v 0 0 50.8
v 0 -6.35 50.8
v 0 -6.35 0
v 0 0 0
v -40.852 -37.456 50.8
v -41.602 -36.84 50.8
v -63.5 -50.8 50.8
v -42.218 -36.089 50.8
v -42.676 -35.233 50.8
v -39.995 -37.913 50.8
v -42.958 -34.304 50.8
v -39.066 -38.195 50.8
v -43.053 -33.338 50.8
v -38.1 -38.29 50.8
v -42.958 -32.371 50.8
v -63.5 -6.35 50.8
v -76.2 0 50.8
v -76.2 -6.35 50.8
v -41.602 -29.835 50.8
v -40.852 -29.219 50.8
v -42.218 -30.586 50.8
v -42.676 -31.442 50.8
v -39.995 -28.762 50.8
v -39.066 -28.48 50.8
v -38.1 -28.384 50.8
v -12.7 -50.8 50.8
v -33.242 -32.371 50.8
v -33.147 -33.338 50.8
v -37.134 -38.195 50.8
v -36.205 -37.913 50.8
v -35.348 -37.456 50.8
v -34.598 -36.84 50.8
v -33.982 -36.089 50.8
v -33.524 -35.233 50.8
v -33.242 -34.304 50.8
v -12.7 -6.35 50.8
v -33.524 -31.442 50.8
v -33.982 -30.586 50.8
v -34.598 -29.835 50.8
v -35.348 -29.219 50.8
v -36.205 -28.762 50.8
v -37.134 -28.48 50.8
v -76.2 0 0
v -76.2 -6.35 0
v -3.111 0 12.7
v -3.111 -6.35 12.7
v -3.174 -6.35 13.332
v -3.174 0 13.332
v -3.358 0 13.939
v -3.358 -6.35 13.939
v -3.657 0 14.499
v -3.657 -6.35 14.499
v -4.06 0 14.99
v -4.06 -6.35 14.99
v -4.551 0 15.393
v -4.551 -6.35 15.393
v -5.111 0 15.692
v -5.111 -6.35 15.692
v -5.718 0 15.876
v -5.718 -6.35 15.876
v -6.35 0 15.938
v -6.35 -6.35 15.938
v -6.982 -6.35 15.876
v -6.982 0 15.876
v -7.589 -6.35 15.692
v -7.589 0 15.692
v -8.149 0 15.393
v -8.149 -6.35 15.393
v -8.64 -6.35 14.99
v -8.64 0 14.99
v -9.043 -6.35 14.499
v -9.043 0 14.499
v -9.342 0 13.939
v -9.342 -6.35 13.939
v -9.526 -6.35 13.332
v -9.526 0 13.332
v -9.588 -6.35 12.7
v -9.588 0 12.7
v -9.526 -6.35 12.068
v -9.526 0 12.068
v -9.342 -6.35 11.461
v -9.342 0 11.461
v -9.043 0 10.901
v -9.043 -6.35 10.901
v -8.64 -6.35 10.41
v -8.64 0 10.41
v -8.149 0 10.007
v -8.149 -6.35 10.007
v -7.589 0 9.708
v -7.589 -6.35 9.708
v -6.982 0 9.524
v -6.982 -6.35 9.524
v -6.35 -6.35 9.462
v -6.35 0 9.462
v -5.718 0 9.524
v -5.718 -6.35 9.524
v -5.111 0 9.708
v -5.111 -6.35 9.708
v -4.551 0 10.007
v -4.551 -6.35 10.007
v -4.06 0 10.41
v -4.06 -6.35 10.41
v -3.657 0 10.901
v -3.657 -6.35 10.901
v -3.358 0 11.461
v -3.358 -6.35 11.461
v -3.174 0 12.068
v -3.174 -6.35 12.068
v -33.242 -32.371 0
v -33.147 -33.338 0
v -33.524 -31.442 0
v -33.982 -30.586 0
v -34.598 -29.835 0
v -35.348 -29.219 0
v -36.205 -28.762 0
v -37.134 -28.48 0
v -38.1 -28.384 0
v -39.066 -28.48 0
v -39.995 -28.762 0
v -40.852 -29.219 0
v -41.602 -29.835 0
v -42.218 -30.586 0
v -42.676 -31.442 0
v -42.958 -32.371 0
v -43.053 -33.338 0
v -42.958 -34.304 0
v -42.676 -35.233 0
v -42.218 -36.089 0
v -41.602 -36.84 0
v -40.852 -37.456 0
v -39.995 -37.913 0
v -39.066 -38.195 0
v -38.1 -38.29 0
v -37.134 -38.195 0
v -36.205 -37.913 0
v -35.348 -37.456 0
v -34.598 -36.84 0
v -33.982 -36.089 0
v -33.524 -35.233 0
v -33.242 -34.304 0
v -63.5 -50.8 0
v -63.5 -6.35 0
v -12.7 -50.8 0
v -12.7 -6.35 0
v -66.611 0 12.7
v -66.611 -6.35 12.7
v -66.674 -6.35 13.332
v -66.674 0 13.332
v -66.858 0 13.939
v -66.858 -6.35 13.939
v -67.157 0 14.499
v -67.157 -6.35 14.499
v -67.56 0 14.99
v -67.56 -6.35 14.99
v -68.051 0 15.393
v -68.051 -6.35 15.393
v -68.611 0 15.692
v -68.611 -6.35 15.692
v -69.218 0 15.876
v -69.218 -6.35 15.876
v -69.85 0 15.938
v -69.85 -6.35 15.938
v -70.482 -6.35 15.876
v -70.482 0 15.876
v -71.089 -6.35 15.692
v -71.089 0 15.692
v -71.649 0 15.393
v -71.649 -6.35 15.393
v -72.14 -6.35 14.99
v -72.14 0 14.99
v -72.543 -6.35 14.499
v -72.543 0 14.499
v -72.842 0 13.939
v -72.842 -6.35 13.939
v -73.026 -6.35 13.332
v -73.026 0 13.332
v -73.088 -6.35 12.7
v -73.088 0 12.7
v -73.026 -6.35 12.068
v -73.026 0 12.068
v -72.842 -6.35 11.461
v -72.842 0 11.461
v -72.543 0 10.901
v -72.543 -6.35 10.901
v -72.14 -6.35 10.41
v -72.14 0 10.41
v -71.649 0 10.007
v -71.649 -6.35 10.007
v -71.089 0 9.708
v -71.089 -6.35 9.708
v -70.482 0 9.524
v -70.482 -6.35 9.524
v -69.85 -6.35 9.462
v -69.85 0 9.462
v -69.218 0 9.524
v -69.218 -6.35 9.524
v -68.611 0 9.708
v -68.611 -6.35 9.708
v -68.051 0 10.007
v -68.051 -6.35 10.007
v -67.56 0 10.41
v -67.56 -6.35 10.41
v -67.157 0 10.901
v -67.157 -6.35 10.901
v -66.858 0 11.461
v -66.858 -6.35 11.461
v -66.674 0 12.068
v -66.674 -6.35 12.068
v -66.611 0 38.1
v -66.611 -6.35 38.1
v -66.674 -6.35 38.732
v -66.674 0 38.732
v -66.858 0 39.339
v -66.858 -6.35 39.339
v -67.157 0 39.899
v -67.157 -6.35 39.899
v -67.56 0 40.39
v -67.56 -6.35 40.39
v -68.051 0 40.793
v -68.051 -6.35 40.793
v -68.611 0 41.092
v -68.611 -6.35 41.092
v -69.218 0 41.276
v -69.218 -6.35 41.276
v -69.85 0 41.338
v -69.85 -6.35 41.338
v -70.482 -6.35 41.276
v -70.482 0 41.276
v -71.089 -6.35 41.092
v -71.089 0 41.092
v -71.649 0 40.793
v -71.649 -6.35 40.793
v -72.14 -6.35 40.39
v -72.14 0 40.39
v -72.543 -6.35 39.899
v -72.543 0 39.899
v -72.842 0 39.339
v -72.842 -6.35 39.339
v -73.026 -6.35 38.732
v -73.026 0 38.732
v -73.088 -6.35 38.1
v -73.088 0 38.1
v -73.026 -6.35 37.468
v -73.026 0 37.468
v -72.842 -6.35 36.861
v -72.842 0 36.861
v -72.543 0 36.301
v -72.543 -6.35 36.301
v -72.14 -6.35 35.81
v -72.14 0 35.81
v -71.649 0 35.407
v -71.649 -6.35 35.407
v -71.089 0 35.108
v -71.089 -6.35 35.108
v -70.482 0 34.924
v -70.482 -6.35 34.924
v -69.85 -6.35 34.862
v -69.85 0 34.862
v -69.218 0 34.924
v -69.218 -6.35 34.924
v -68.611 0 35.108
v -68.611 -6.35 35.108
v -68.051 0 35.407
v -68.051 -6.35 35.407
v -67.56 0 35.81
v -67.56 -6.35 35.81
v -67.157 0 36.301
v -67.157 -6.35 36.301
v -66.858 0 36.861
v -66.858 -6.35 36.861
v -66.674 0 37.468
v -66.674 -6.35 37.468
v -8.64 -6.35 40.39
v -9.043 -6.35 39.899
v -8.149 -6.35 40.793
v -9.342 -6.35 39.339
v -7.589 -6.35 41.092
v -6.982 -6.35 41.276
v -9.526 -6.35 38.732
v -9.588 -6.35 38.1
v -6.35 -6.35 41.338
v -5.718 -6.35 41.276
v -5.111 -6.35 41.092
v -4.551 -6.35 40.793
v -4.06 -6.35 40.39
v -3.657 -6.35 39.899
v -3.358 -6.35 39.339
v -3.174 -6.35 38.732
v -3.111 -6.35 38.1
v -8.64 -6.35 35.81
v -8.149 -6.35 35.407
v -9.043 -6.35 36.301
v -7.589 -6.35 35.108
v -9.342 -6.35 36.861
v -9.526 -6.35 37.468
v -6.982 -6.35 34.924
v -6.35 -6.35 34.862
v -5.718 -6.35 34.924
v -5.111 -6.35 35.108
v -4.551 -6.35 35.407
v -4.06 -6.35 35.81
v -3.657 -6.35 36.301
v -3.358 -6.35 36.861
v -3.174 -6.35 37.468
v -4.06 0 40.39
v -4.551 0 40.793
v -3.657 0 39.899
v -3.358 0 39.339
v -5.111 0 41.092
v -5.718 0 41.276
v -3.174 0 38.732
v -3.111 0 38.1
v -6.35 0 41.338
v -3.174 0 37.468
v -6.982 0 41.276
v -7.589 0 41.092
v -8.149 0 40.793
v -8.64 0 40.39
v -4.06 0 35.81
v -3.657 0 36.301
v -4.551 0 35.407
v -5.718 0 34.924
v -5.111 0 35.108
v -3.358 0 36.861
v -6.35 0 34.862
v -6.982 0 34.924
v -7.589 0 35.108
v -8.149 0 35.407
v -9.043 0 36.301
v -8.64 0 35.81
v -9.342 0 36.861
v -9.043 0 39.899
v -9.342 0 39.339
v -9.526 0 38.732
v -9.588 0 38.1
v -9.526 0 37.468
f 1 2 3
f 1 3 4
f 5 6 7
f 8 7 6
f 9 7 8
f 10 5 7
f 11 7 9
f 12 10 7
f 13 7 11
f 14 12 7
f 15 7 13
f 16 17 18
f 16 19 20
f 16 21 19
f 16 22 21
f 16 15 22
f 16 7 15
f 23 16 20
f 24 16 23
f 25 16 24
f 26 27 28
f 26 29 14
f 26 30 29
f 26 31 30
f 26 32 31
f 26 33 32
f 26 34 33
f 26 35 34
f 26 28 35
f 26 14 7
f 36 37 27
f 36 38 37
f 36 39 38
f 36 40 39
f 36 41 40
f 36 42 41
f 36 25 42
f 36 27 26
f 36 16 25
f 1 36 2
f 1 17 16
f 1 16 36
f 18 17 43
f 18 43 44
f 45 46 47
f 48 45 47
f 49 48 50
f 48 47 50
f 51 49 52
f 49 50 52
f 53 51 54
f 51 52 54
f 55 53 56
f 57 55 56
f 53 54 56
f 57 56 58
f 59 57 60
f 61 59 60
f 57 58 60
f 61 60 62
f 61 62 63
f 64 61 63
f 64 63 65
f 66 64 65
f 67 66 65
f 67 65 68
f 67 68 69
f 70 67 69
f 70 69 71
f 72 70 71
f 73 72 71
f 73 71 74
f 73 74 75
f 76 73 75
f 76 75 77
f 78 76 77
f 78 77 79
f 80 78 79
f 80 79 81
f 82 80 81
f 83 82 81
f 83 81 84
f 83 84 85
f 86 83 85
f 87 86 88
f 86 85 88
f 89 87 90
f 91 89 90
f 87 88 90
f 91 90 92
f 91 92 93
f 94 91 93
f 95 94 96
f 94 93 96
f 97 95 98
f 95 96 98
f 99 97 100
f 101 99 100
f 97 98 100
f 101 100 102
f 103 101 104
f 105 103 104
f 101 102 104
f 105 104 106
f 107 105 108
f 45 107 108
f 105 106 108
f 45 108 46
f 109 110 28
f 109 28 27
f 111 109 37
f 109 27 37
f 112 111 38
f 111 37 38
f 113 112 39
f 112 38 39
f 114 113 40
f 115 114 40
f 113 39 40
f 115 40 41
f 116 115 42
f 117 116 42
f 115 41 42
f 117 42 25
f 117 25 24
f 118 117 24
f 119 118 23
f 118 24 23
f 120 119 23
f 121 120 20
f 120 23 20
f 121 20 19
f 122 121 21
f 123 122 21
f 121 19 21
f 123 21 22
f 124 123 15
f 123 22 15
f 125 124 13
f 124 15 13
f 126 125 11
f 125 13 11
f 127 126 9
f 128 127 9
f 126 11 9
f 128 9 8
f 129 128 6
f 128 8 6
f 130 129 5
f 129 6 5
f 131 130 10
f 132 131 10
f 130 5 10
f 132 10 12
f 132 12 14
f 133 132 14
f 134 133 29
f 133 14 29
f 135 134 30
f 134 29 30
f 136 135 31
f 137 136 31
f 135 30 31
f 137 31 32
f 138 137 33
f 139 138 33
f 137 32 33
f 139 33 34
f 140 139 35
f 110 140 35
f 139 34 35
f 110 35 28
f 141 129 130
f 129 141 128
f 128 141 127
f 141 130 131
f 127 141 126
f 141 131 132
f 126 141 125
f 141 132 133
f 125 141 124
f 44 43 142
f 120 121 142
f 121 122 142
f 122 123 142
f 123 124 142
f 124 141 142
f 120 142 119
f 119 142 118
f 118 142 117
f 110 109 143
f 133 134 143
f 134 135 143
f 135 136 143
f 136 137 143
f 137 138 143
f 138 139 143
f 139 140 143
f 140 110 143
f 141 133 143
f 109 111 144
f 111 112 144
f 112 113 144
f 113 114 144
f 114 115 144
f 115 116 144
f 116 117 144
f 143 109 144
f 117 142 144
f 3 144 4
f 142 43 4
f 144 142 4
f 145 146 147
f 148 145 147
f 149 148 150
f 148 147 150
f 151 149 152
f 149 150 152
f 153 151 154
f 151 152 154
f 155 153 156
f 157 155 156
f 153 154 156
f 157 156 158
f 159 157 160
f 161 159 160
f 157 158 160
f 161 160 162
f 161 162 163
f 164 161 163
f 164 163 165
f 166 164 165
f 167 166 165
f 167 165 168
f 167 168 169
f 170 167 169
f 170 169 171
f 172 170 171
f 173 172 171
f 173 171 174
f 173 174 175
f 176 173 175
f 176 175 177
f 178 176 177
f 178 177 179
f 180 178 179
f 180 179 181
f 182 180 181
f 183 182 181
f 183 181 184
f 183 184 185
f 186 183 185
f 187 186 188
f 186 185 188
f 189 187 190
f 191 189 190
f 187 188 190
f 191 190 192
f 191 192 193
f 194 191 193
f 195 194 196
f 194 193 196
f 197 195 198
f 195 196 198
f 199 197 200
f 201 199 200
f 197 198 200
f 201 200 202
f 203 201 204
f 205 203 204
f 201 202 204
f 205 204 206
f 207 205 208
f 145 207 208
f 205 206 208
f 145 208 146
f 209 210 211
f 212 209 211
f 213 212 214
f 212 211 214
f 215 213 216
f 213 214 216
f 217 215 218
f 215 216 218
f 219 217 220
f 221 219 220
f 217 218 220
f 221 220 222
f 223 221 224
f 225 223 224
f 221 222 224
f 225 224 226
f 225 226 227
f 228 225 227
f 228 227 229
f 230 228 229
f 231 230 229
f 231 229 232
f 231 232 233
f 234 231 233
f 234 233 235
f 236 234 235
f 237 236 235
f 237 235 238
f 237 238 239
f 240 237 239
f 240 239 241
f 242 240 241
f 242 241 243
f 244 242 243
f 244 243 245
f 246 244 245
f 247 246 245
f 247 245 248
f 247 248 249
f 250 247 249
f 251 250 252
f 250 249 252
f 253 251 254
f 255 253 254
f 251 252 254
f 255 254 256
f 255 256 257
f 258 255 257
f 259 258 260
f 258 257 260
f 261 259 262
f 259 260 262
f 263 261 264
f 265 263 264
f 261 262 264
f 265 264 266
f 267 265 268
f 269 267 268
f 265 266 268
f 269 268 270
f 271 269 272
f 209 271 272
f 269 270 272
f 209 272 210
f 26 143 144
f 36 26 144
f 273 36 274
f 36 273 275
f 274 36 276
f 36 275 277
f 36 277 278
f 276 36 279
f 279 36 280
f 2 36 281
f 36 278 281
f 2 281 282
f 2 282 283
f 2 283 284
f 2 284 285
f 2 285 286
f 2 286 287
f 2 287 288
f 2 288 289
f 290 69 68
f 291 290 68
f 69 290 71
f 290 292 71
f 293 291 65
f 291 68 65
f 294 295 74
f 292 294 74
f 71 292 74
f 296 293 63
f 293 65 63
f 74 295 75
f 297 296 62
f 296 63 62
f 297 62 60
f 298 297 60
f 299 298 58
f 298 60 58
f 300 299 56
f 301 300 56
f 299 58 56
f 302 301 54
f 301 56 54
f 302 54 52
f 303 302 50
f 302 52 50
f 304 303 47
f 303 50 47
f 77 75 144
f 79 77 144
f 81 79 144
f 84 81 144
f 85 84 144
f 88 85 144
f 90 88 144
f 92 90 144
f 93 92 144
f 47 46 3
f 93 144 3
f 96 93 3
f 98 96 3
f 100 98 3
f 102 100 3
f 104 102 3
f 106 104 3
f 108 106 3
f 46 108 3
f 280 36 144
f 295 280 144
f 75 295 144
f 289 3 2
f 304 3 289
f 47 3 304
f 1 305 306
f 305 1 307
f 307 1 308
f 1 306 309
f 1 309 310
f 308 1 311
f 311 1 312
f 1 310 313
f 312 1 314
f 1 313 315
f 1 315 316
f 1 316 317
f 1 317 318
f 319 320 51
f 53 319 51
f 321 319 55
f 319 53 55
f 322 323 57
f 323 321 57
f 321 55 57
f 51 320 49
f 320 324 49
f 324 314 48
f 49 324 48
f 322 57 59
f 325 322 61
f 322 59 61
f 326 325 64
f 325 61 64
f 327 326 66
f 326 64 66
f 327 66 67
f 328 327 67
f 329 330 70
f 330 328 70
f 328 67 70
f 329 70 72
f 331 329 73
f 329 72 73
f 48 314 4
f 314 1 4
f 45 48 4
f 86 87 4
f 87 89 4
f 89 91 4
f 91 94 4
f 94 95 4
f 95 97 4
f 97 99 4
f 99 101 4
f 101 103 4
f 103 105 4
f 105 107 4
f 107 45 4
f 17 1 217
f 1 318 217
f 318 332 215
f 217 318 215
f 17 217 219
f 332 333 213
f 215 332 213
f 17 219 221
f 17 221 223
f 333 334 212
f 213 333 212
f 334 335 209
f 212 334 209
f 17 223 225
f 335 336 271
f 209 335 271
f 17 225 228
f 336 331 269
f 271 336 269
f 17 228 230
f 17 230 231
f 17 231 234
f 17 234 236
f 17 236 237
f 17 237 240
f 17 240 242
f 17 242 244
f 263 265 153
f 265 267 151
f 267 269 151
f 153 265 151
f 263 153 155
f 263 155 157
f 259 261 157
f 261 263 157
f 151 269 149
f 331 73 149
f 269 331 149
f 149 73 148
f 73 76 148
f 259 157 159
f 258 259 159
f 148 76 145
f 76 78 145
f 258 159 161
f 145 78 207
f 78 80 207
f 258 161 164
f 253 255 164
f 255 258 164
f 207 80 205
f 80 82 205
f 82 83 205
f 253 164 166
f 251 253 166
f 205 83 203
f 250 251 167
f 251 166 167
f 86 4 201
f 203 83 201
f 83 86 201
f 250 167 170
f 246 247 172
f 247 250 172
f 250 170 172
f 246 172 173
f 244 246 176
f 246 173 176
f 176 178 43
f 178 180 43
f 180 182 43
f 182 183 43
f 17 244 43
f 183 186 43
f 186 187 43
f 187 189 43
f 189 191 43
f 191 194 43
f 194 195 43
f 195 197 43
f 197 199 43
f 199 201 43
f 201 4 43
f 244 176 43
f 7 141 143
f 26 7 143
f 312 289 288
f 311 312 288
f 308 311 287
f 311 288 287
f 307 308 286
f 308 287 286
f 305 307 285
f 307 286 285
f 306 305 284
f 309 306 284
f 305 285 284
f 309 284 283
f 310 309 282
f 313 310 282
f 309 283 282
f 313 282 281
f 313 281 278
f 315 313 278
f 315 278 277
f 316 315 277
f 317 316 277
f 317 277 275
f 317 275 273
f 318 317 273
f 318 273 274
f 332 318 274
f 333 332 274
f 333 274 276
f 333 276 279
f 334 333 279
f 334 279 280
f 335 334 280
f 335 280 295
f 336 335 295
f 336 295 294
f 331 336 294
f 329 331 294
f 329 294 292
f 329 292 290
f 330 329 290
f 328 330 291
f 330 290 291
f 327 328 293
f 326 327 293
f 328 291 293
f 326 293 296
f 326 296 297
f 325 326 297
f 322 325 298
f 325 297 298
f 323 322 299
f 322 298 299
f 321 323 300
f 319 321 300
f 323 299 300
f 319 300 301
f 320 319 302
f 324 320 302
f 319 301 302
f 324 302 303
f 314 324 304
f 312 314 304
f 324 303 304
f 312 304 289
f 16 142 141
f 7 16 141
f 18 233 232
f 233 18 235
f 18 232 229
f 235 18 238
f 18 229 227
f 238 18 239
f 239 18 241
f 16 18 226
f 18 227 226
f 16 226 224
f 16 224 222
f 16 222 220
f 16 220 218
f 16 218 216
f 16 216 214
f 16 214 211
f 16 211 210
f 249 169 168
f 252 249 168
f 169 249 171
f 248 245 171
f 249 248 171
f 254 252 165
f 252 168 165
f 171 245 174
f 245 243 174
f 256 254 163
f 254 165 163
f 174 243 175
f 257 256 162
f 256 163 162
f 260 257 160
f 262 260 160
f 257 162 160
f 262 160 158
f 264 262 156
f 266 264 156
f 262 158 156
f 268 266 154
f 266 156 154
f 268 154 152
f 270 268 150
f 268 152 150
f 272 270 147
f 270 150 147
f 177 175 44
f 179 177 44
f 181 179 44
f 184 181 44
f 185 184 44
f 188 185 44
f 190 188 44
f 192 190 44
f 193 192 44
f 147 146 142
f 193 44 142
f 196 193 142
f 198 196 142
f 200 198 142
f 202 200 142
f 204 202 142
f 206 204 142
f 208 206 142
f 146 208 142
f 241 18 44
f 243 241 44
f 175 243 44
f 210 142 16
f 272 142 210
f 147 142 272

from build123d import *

# Parameters (mm, degrees)
F1_DEPTH = 50.8
F2_R     = 4.953
F3_DEPTH = 50.8
F5_R     = 3.2385
F4_R     = 3.2385
F6_DEPTH = 25.4


with BuildPart() as f1:
    # F0 (on Top) → F1 (new body)
    with BuildSketch(Plane.XY):
        Polygon((0, -6.35), (0, 0), (-76.2, 0), (-76.2, -6.35), (-63.5, -6.35), (-63.5, -50.8), (-12.7, -50.8), (-12.7, -6.35), align=None)
    extrude(amount=F1_DEPTH)

    # F2 (on face) → F3 (cut)
    with BuildSketch(Plane.XY.offset(50.8)):
        with Locations((-38.1, -33.3375)):
            Circle(F2_R)
    extrude(amount=-F3_DEPTH, mode=Mode.SUBTRACT)

    # F5 (on face) + F4 (on face) → F6 (cut)
    with BuildSketch(Plane.XZ.offset(6.35)):
        with Locations((-69.85, 12.7)):
            Circle(F5_R)
        with Locations((-69.85, 38.1)):
            Circle(F5_R)
    with BuildSketch(Plane.XZ.offset(6.35)):
        with Locations((-6.35, 12.7)):
            Circle(F4_R)
        with Locations((-6.35, 38.1)):
            Circle(F4_R)
    extrude(amount=-F6_DEPTH, mode=Mode.SUBTRACT)


solid = f1.part
